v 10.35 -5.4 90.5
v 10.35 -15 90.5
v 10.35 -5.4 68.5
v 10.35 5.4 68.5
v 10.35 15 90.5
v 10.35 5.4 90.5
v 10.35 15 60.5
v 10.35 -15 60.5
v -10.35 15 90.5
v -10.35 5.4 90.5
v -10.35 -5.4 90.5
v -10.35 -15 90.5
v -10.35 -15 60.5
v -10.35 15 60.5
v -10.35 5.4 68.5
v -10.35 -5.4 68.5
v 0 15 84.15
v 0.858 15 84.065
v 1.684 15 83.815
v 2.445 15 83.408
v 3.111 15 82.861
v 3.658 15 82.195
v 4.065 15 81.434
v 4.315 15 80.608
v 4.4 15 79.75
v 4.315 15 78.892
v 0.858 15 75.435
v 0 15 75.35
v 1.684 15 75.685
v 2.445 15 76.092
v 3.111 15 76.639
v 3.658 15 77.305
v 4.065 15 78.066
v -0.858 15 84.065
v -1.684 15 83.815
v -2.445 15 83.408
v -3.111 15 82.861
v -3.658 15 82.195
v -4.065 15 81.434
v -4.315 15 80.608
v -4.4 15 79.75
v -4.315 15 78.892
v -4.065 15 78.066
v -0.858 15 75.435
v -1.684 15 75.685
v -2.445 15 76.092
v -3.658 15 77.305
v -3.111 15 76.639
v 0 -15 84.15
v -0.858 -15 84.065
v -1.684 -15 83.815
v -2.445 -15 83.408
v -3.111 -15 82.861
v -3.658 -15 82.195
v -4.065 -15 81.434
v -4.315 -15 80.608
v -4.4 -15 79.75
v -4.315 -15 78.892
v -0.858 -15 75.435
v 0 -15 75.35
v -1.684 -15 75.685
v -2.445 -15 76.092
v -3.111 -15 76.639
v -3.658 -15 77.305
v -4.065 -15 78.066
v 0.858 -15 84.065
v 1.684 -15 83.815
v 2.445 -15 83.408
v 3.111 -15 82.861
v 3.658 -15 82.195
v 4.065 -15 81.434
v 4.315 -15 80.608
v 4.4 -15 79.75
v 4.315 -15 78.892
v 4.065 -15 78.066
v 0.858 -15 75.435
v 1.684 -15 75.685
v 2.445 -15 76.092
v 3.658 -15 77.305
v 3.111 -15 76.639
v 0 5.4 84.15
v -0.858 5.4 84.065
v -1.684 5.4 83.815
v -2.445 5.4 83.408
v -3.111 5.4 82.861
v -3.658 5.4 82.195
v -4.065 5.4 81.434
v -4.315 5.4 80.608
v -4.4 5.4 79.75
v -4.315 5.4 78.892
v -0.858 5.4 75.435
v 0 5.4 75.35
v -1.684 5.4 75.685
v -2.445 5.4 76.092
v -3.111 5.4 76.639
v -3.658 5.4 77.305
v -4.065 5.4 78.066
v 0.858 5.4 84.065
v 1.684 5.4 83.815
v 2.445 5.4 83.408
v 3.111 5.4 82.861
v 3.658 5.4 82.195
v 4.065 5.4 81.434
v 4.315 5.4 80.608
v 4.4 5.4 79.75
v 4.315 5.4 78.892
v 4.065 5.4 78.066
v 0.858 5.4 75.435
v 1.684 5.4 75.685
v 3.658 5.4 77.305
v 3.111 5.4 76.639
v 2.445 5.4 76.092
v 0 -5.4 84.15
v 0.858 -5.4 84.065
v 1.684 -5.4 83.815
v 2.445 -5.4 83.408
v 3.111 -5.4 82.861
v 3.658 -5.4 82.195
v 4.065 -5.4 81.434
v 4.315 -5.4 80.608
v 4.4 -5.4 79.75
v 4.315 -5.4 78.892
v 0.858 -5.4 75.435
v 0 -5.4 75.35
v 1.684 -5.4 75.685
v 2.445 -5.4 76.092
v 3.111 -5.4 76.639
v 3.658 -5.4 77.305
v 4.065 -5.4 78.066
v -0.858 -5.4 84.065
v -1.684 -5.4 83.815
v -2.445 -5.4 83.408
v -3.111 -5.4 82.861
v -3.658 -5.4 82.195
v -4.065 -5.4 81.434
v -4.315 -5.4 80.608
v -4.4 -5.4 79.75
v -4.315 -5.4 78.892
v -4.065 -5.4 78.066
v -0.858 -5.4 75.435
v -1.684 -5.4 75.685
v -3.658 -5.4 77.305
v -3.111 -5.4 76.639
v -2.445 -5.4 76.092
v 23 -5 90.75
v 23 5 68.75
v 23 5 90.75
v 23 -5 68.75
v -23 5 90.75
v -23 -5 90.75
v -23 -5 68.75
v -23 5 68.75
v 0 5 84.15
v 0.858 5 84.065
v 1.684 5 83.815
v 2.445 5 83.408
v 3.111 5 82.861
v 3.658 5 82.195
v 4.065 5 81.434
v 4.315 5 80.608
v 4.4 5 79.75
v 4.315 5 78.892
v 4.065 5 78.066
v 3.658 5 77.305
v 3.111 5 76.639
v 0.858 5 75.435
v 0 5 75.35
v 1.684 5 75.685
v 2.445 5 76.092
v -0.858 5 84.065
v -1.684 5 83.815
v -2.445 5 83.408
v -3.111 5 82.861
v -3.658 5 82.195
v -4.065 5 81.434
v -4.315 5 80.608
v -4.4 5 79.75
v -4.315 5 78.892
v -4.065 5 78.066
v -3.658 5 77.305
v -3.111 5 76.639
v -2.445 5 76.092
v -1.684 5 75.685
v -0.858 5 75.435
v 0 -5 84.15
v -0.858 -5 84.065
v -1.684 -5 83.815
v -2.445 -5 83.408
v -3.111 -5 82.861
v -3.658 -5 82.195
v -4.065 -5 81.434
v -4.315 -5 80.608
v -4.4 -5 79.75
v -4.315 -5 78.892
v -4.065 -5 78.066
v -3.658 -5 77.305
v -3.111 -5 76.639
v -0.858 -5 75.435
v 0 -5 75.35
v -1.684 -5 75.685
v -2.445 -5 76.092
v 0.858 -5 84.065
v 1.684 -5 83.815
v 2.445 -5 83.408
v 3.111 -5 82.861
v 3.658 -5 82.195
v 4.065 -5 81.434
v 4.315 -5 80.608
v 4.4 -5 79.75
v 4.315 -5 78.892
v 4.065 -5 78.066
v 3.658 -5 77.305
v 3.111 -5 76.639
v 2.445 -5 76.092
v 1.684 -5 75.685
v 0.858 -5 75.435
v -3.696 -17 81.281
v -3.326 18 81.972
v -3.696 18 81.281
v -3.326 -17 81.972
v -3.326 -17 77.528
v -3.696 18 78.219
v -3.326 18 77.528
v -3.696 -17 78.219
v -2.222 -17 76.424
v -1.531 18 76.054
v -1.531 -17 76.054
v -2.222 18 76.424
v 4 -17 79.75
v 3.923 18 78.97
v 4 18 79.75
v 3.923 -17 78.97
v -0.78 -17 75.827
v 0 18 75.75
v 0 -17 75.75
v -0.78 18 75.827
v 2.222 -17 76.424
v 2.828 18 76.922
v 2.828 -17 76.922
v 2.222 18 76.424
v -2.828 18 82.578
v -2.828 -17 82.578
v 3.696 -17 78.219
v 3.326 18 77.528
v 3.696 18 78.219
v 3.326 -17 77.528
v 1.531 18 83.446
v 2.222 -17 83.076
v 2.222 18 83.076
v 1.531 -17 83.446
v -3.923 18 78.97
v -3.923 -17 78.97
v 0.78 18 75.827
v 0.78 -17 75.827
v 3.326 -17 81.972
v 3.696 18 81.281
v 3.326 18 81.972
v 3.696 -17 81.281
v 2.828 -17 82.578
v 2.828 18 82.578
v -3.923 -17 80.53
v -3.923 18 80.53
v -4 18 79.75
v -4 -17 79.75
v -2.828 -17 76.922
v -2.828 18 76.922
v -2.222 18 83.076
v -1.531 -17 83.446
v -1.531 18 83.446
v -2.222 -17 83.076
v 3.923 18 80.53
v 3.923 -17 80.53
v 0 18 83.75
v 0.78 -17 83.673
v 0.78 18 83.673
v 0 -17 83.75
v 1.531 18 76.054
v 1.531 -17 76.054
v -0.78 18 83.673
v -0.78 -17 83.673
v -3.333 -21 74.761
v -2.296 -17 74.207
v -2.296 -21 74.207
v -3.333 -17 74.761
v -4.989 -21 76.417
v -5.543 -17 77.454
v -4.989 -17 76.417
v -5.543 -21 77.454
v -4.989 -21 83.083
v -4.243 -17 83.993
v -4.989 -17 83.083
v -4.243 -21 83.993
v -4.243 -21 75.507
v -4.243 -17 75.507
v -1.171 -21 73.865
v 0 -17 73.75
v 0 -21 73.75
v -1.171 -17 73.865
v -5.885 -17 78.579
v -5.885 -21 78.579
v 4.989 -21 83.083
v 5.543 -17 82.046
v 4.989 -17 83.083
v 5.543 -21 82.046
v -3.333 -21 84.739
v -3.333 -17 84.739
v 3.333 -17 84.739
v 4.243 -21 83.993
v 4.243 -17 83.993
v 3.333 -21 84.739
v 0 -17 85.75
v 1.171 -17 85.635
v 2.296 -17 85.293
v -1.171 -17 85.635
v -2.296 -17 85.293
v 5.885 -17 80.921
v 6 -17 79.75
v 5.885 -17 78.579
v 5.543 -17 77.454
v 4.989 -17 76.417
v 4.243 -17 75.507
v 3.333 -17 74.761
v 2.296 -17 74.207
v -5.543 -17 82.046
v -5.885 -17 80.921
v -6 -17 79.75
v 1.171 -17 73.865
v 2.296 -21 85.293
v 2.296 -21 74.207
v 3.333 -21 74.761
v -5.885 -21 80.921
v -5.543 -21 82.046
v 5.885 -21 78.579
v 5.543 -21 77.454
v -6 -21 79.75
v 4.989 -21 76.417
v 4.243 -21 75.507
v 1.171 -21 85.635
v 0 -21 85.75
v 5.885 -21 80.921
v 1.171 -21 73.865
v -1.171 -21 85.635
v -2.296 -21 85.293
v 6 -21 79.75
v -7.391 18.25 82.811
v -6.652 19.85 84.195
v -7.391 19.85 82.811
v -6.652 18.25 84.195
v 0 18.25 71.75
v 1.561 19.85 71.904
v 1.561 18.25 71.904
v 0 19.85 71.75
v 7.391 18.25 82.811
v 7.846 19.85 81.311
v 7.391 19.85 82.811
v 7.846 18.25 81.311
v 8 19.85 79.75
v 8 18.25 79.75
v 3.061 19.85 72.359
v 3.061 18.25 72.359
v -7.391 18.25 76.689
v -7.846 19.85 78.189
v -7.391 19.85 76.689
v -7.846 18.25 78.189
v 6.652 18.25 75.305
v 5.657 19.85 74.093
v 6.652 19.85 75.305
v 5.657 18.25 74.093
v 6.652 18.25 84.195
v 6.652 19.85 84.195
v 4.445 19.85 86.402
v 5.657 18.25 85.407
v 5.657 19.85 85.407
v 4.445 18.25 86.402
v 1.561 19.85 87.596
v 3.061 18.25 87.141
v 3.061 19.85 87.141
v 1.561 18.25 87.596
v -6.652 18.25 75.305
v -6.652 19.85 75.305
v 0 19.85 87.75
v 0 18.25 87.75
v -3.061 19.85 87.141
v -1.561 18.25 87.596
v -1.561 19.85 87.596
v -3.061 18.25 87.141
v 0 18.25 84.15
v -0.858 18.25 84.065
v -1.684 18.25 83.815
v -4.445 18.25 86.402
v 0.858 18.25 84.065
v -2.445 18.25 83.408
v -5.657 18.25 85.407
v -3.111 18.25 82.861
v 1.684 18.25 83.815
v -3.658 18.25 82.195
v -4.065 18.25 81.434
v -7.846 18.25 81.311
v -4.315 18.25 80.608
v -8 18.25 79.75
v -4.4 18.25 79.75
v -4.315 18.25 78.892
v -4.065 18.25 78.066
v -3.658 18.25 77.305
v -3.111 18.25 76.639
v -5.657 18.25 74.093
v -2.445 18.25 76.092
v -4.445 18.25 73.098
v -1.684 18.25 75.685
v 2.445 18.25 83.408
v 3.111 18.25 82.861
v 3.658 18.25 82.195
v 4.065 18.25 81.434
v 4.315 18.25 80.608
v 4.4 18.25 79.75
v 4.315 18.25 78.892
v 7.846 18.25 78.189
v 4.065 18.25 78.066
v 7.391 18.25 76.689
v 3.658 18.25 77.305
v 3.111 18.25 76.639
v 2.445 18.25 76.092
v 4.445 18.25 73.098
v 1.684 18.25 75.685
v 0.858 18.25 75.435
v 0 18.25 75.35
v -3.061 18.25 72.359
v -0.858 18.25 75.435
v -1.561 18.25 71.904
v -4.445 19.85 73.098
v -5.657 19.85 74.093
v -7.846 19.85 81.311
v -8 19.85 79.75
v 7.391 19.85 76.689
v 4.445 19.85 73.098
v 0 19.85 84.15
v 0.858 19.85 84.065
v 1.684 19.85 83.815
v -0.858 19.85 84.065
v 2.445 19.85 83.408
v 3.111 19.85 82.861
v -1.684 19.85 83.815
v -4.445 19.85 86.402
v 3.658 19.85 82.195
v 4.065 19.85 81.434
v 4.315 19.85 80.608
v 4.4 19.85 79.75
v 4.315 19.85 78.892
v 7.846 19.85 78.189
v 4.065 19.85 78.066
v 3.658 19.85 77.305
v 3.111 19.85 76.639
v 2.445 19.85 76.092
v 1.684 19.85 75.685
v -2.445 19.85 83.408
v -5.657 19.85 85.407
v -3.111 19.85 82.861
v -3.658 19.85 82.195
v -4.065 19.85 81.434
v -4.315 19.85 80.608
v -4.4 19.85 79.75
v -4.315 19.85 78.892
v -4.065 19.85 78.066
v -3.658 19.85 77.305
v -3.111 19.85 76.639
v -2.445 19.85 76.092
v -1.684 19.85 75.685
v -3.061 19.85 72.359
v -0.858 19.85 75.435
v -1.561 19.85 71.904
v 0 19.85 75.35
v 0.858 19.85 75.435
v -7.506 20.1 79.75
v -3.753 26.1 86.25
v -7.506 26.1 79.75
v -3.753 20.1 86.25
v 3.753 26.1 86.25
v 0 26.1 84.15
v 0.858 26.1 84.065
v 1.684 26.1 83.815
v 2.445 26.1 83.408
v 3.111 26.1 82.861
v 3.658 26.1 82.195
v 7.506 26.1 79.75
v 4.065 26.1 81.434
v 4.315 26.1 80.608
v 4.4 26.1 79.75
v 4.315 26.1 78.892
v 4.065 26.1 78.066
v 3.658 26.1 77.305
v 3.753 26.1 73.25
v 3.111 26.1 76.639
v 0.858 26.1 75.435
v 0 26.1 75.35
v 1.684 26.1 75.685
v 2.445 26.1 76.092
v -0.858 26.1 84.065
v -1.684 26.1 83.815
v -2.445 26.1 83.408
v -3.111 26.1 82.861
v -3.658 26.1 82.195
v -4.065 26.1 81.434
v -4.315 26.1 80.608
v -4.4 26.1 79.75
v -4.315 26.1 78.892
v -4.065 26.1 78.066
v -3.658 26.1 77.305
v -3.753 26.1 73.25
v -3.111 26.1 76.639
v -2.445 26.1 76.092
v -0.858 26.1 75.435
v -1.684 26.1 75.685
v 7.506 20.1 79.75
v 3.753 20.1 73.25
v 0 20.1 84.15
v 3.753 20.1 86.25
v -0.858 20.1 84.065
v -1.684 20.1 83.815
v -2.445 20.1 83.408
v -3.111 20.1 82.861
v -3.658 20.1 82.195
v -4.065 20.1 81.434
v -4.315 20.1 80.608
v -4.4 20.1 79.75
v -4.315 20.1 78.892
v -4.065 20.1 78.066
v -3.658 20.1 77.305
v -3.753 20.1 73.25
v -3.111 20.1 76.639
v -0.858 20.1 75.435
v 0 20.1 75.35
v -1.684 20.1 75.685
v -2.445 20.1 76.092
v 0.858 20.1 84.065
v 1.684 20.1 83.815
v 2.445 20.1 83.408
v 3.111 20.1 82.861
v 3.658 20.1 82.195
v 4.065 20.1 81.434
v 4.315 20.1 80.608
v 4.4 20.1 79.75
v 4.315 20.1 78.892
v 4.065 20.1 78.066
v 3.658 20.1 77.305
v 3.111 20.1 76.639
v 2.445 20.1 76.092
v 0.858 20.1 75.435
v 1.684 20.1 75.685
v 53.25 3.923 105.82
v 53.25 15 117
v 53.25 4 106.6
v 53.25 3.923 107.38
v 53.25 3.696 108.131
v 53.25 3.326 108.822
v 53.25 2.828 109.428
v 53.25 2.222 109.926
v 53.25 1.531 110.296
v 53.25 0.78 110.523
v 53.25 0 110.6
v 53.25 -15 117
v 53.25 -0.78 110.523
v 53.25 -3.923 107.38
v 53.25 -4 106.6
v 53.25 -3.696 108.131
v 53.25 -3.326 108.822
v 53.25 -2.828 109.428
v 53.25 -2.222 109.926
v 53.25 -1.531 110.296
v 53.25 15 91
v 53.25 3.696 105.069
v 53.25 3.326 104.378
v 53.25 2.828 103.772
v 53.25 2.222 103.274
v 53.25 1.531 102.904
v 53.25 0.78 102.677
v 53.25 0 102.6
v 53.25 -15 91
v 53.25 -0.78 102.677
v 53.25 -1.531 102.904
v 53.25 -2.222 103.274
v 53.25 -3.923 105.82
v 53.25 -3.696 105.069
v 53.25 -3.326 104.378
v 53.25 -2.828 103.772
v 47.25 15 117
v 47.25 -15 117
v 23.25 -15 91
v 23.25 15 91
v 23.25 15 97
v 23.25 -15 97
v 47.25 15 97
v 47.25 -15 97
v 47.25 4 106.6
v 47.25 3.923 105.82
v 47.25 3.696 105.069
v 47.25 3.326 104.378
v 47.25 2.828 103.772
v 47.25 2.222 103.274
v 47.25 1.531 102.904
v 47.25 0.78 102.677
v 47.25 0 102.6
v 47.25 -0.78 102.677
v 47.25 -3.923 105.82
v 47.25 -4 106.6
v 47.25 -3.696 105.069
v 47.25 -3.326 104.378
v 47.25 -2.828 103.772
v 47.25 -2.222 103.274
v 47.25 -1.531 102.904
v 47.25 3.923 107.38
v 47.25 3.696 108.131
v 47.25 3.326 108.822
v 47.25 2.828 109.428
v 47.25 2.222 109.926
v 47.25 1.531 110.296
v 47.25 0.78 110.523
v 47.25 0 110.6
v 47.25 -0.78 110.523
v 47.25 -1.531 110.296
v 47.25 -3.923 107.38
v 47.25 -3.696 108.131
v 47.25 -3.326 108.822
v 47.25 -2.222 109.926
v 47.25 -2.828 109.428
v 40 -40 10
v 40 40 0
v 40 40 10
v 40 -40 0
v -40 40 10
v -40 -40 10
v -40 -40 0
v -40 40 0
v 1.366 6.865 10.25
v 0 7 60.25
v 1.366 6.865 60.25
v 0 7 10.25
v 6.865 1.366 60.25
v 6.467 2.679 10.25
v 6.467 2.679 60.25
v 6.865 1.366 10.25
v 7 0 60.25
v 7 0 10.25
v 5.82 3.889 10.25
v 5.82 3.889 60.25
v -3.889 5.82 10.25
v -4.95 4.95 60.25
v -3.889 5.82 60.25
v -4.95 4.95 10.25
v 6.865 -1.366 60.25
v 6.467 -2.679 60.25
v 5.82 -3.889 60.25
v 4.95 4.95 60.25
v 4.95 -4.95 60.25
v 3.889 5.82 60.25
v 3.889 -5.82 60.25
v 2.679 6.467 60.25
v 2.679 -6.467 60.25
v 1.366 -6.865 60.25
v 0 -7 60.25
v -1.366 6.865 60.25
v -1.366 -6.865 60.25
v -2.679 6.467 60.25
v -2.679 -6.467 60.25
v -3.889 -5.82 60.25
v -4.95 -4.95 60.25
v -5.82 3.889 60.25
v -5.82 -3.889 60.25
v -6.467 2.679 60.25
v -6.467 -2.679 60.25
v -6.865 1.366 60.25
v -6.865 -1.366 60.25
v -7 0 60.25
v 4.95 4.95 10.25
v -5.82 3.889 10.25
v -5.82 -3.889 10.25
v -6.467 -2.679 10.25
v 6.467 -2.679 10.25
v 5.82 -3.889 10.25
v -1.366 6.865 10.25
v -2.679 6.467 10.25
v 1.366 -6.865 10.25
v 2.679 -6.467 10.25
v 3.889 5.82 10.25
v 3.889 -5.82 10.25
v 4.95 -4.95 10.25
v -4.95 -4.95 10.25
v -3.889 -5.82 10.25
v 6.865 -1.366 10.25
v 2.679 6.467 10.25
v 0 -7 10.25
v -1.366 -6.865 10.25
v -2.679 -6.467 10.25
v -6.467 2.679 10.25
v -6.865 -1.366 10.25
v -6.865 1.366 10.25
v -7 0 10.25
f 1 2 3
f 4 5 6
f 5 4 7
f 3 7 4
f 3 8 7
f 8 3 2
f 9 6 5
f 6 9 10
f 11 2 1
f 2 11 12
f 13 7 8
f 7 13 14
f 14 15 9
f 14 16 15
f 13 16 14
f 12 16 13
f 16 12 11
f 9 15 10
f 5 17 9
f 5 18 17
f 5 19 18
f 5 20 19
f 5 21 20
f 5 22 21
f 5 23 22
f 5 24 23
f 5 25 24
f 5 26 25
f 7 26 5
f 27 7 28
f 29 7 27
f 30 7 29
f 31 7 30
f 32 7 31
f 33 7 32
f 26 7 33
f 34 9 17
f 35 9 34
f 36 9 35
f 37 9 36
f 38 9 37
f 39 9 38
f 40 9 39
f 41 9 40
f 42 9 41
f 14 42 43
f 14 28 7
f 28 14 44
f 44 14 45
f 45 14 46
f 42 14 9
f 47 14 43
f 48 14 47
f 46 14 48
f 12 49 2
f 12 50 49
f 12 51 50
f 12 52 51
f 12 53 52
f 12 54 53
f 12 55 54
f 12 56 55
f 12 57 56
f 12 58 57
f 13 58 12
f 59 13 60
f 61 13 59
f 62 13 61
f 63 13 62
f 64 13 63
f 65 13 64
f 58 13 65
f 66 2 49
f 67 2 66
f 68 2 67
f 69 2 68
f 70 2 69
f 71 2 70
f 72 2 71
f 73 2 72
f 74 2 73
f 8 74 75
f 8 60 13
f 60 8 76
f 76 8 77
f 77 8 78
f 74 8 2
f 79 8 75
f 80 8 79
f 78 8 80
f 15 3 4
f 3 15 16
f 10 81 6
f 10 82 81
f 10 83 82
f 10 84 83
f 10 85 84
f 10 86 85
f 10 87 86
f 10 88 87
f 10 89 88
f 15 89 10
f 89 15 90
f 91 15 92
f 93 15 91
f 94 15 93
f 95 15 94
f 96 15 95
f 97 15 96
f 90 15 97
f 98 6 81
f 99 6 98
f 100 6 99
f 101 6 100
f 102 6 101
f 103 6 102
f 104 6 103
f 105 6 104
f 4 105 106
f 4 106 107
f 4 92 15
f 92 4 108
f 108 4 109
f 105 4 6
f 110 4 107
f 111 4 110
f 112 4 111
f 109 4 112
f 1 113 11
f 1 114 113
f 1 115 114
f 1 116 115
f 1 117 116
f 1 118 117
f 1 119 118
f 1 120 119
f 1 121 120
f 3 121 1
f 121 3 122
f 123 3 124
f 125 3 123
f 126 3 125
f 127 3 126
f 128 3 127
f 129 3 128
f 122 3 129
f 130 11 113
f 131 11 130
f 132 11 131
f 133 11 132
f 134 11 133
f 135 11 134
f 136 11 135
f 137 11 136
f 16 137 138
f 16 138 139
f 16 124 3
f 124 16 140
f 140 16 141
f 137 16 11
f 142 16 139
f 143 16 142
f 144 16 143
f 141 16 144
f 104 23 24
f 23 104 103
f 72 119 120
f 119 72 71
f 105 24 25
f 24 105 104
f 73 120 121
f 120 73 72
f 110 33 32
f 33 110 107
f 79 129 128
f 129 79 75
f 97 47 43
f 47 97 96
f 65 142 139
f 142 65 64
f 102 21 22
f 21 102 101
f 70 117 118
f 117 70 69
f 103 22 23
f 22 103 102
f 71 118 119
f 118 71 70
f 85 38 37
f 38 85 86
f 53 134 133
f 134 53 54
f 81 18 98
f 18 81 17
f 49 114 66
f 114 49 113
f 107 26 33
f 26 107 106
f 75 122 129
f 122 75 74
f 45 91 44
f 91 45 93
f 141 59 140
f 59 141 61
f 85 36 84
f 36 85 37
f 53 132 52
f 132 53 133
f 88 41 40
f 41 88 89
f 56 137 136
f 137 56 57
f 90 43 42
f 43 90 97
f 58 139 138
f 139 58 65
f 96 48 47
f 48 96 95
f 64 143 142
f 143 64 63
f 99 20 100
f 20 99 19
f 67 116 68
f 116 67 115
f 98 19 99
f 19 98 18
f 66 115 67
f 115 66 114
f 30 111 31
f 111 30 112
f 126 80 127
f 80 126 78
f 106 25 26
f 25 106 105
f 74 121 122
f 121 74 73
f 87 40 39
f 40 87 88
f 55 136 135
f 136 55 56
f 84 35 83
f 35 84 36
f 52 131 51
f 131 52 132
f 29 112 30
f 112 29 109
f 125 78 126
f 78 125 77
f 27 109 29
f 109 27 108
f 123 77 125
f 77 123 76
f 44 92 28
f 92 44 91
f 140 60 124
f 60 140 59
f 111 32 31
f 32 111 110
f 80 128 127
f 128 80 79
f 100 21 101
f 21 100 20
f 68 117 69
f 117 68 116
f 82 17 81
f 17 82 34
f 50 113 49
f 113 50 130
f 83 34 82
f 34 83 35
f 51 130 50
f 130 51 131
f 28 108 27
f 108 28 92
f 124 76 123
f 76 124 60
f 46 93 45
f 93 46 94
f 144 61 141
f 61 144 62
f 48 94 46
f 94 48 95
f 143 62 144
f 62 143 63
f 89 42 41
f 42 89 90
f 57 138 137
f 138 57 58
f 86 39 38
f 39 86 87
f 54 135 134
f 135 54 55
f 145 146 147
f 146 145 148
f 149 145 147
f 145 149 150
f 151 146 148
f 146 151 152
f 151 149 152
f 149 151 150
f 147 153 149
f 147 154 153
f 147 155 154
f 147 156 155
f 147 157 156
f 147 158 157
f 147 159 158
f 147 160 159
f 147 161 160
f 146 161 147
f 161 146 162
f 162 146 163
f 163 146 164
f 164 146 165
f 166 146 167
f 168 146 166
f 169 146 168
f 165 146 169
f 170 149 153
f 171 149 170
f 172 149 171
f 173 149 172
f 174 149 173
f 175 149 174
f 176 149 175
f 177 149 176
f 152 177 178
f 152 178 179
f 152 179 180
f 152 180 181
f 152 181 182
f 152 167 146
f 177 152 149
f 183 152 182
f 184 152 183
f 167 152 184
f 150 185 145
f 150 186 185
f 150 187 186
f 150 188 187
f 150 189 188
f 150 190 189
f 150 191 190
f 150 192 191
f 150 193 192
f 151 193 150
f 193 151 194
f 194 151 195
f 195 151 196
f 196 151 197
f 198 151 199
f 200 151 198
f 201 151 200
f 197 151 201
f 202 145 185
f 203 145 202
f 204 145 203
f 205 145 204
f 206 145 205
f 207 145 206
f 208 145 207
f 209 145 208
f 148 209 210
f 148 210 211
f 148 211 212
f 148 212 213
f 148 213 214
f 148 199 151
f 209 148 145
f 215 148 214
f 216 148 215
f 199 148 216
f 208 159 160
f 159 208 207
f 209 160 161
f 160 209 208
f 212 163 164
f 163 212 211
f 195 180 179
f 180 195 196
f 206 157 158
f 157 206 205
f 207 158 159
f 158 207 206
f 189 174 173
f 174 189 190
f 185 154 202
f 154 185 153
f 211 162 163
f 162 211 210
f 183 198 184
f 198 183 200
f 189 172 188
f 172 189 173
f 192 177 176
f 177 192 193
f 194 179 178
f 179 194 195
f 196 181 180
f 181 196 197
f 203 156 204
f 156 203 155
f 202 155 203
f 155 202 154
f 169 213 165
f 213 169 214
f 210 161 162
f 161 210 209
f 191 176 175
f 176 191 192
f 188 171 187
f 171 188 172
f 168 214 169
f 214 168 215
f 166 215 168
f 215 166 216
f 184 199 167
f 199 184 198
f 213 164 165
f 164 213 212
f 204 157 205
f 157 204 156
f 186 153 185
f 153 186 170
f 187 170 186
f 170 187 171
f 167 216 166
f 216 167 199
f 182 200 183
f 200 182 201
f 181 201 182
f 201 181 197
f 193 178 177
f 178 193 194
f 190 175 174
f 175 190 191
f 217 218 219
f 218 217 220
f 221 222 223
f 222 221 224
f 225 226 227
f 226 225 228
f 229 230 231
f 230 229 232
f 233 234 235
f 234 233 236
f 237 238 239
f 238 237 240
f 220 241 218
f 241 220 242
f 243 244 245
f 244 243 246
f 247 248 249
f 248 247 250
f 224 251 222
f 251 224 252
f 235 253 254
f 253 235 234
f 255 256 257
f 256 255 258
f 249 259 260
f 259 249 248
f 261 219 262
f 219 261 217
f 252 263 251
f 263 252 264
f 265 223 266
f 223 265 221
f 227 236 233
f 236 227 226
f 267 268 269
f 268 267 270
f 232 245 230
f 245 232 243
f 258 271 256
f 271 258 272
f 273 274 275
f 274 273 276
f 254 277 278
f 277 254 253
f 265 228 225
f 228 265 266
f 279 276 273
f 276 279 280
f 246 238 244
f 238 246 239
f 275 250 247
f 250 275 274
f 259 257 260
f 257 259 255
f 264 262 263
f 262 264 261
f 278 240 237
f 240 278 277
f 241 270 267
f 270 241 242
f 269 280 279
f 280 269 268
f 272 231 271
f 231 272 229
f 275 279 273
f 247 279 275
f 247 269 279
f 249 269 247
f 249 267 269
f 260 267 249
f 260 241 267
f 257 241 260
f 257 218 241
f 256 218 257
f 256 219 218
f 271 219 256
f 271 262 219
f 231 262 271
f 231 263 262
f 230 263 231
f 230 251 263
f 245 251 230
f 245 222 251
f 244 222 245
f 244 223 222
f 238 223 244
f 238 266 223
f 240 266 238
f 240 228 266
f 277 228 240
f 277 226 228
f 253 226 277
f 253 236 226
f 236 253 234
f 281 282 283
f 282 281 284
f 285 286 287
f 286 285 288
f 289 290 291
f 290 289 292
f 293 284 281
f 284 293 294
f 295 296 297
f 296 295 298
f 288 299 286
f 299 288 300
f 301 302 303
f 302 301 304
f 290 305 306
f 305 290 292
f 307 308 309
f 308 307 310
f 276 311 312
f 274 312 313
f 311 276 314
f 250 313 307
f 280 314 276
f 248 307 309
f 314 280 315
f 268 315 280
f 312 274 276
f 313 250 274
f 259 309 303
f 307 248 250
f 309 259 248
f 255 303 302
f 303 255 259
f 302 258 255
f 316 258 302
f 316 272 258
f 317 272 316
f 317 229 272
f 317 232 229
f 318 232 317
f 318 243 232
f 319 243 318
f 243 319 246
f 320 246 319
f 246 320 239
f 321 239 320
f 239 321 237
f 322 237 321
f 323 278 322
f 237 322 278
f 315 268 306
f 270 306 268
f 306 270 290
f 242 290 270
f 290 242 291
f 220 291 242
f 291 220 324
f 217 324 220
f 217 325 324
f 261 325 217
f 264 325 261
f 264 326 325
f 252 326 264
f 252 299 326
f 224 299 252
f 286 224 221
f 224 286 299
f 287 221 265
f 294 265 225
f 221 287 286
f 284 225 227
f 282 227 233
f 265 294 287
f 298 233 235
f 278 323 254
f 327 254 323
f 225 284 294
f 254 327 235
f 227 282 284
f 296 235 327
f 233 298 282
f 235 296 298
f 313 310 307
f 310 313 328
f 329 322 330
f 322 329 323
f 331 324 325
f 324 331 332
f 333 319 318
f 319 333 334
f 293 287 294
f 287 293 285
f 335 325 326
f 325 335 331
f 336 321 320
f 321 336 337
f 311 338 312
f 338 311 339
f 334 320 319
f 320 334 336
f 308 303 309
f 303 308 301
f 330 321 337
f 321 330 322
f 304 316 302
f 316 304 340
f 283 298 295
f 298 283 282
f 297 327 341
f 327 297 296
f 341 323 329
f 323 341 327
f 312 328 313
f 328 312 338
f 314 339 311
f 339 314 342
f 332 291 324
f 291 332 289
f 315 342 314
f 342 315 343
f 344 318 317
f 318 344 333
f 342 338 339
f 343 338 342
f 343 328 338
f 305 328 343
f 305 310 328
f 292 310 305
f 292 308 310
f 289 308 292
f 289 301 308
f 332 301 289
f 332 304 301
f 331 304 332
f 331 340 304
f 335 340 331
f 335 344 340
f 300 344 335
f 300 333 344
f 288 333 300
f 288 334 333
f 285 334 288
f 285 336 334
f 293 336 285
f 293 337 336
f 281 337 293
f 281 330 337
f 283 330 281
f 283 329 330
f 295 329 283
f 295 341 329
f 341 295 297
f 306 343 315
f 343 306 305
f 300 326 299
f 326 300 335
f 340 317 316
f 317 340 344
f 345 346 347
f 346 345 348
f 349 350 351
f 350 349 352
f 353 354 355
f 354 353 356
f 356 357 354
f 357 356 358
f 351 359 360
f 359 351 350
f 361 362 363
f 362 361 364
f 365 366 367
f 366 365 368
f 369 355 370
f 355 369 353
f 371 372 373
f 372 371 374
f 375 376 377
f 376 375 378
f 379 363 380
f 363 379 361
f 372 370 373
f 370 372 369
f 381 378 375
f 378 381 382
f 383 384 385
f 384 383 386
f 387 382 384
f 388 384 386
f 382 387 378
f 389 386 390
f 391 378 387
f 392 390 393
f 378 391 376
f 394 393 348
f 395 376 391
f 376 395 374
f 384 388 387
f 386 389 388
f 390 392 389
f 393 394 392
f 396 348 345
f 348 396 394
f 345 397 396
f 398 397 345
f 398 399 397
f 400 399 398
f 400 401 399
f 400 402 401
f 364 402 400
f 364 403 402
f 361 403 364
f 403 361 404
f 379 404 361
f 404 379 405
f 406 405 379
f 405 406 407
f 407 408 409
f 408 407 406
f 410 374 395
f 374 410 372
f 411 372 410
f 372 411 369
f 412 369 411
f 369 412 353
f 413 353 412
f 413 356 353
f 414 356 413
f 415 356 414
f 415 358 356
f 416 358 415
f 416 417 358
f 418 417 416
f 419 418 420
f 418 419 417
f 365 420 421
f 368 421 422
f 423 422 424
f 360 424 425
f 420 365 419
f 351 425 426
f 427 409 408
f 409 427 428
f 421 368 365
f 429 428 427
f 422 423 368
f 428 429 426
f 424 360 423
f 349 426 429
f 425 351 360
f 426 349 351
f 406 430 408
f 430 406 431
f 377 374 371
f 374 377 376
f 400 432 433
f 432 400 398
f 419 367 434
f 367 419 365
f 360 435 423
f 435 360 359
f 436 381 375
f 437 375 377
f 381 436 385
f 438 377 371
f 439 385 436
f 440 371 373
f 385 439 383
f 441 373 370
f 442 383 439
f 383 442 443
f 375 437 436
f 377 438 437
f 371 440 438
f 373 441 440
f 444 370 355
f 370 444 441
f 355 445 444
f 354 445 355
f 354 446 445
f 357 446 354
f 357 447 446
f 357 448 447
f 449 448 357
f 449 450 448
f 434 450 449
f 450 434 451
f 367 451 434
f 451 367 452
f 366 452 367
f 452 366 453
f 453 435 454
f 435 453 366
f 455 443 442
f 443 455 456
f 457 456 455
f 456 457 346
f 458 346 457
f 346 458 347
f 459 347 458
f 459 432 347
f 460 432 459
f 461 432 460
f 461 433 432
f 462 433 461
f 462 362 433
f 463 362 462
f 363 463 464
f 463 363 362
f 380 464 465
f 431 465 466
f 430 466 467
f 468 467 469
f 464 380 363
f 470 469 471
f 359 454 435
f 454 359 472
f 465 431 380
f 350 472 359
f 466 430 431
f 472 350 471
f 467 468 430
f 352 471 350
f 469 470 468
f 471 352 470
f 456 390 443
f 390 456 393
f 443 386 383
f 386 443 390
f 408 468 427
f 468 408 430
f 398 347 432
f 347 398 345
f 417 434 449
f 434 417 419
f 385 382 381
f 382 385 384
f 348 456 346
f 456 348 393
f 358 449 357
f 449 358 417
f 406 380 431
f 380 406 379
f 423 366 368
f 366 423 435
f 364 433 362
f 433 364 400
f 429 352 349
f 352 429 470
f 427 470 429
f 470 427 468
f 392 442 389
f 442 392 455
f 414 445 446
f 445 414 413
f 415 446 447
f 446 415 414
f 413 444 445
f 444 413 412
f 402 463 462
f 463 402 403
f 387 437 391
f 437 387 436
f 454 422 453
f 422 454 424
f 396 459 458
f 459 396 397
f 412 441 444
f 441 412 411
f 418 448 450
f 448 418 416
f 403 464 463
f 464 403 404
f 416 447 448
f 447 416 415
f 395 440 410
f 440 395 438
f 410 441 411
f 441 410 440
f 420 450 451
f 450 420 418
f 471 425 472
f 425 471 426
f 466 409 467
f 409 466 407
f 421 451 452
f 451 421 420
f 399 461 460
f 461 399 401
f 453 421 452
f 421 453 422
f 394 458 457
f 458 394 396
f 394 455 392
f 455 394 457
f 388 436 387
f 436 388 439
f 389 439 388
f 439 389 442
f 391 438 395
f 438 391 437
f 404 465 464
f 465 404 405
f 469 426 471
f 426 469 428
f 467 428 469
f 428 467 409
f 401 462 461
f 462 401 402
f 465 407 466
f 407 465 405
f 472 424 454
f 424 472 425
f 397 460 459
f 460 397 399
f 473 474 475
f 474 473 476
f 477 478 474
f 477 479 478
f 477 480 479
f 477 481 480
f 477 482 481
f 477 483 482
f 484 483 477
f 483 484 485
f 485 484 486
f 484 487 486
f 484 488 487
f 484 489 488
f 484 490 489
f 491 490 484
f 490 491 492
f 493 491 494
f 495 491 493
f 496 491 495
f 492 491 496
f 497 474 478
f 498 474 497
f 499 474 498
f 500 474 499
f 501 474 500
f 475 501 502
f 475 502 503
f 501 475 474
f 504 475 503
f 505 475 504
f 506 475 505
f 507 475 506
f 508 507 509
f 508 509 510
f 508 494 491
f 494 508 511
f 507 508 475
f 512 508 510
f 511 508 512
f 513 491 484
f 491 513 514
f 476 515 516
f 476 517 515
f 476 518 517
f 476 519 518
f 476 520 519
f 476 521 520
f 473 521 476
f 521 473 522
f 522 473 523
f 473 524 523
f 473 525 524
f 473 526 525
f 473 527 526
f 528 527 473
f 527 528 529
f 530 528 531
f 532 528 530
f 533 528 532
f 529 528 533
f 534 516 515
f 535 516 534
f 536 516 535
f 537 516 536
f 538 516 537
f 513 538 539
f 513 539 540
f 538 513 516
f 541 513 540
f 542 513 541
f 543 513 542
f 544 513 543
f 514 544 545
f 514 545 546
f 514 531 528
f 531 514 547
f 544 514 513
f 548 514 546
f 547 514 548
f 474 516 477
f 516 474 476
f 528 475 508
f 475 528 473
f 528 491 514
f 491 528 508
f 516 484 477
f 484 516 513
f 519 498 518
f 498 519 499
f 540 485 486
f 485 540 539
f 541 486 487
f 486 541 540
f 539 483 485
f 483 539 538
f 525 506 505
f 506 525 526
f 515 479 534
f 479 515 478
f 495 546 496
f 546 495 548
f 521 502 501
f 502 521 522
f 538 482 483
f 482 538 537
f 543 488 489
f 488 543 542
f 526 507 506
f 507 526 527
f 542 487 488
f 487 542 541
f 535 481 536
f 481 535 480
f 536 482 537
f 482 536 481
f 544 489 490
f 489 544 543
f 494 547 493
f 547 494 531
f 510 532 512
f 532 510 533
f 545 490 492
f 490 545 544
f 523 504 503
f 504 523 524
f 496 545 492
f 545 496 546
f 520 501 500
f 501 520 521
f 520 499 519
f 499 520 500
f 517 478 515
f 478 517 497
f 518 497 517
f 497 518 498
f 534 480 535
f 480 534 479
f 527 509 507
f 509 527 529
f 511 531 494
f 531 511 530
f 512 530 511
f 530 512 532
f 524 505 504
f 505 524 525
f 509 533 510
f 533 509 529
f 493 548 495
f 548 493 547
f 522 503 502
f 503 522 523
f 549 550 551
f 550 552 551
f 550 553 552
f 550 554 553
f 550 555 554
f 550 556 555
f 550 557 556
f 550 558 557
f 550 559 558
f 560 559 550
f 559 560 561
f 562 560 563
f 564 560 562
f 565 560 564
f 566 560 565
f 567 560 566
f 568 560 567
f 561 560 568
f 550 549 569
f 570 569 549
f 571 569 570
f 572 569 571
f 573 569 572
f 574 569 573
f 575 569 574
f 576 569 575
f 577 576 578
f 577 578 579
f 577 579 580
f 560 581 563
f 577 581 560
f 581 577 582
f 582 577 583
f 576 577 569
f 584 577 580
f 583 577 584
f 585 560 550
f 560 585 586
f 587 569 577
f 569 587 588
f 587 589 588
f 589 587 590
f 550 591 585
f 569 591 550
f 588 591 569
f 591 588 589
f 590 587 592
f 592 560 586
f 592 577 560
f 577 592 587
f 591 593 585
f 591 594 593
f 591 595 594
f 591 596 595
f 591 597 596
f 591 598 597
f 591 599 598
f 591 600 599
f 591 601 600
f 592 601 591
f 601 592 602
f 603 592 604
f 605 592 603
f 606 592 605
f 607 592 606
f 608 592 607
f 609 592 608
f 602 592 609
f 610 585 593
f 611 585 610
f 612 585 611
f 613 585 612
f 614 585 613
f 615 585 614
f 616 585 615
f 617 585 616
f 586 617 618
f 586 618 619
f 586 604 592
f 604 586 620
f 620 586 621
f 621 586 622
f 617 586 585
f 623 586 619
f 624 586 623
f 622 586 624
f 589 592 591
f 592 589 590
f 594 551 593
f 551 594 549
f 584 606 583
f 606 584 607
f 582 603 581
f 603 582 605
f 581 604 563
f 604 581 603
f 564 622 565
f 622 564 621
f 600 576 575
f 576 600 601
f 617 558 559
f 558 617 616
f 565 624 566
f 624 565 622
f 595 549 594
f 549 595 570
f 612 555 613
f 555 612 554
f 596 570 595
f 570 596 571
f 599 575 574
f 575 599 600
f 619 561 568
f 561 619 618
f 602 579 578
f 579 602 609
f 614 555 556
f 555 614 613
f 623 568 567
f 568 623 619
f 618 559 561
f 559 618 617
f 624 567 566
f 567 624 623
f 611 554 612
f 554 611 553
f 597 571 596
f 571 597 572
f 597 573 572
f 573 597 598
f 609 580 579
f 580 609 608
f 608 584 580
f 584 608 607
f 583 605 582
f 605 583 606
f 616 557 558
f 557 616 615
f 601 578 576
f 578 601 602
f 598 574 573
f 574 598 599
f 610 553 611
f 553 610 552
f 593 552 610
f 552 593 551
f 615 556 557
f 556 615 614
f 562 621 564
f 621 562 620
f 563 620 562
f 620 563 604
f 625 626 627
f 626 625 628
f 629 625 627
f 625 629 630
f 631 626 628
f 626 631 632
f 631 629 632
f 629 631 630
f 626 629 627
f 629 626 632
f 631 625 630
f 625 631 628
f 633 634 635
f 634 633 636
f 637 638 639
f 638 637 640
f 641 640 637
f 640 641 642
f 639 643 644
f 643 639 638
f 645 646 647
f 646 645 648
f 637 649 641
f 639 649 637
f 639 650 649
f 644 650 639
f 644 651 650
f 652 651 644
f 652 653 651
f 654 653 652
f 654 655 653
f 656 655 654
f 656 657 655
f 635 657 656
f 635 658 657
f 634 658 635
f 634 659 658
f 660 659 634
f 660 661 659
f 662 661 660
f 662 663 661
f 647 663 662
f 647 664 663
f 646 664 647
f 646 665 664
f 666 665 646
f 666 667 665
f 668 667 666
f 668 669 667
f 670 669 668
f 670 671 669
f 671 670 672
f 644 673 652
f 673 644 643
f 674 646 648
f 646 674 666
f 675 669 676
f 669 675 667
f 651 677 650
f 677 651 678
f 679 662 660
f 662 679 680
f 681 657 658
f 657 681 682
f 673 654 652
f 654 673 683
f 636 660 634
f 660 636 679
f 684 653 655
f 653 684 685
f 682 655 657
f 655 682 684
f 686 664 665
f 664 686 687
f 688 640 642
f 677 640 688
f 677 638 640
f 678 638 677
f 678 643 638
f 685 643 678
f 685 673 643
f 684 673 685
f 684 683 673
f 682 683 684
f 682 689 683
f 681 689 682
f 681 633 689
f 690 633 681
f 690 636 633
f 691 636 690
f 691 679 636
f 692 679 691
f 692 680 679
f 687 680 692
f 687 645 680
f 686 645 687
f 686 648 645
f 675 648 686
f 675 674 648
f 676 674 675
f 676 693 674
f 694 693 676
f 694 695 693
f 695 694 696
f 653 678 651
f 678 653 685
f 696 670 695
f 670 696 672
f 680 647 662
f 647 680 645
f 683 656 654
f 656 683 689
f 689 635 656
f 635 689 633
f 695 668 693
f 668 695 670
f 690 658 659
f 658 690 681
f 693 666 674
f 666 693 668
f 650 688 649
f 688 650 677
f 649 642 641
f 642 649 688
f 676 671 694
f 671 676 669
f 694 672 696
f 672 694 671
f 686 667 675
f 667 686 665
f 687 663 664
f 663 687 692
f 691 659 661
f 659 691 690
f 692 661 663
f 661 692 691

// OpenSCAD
$fn = 32;

// ------------------------------------------------------------------------
// Lamp arm: column d14 x 50 mm, arm 46 mm
// Every part is its own module, assembly() places every instance.
// ------------------------------------------------------------------------

// --- part 1 ---
module lamp_base() {
  difference() {
    translate([-40, -40, 0]) cube([80, 80, 10]);
  }
}

// --- part 2 ---
module lamp_column() {
  cylinder(h = 50, d = 14);
}

// --- part 3 ---
module head_fork() {
  difference() {
    translate([-10.35, -15, 0]) cube([20.7, 30, 30]);
    translate([-11.35, -5.4, 8]) cube([22.7, 10.8, 23]);
    translate([0, 0, 19.25]) rotate([90, 0, 0]) cylinder(h = 32, d = 8.8, center = true);
  }
}

// --- part 4 ---
module lamp_arm() {
  difference() {
    translate([-23, -5, 0]) cube([46, 10, 22]);
    translate([0, 0, 11]) rotate([90, 0, 0]) cylinder(h = 12, d = 8.8, center = true);
  }
}

// --- part 5 ---
module arm_pin() {
  rotate([0, 90, 0]) cylinder(h = 36, d = 8, center = true);
  translate([-21, 0, 0]) rotate([0, 90, 0]) cylinder(h = 4, d = 12);
}

// --- part 6 ---
module arm_washer() {
  difference() {
      translate([0, 0, 0]) cylinder(h = 1.6, d = 16);
      translate([0, 0, -1]) cylinder(h = 3.6, d = 8.8);
    }
}

// --- part 7 ---
module arm_nut() {
  difference() {
    linear_extrude(height = 6) polygon(points = [[7.506, 0], [3.753, 6.5], [-3.753, 6.5], [-7.506, 0], [-3.753, -6.5], [3.753, -6.5]]);
    translate([0, 0, -1]) cylinder(h = 8, d = 8.8);
  }
}

// --- part 8 ---
module shade_bracket() {
  difference() {
    translate([-15, -15, 0]) cube([30, 30, 26]);
    translate([-16, -16, 6]) cube([25, 32, 21]);
    translate([12, 0, 15.6]) rotate([0, 90, 0]) cylinder(h = 8, d = 8, center = true);
  }
}

// --- assembly ---
module assembly() {
  color([0.80, 0.24, 0.20]) translate([0, 0, 0]) rotate([0, 0, 0]) lamp_base();
  color([0.20, 0.45, 0.75]) translate([0, 0, 10.25]) rotate([0, 0, 0]) lamp_column();
  color([0.25, 0.62, 0.32]) translate([0, 0, 60.5]) rotate([0, 0, 0]) head_fork();
  color([0.92, 0.70, 0.18]) translate([0, 0, 68.75]) rotate([0, 0, 0]) lamp_arm();
  color([0.58, 0.35, 0.70]) translate([0, 0, 79.75]) rotate([0, 0, 90]) arm_pin();
  color([0.16, 0.66, 0.66]) translate([0, 19.85, 79.75]) rotate([90, 0, 0]) arm_washer();
  color([0.85, 0.48, 0.18]) translate([0, 26.1, 79.75]) rotate([90, 0, 0]) arm_nut();
  color([0.55, 0.60, 0.65]) translate([38.25, 0, 91]) rotate([0, 0, 0]) shade_bracket();
}

assembly();
